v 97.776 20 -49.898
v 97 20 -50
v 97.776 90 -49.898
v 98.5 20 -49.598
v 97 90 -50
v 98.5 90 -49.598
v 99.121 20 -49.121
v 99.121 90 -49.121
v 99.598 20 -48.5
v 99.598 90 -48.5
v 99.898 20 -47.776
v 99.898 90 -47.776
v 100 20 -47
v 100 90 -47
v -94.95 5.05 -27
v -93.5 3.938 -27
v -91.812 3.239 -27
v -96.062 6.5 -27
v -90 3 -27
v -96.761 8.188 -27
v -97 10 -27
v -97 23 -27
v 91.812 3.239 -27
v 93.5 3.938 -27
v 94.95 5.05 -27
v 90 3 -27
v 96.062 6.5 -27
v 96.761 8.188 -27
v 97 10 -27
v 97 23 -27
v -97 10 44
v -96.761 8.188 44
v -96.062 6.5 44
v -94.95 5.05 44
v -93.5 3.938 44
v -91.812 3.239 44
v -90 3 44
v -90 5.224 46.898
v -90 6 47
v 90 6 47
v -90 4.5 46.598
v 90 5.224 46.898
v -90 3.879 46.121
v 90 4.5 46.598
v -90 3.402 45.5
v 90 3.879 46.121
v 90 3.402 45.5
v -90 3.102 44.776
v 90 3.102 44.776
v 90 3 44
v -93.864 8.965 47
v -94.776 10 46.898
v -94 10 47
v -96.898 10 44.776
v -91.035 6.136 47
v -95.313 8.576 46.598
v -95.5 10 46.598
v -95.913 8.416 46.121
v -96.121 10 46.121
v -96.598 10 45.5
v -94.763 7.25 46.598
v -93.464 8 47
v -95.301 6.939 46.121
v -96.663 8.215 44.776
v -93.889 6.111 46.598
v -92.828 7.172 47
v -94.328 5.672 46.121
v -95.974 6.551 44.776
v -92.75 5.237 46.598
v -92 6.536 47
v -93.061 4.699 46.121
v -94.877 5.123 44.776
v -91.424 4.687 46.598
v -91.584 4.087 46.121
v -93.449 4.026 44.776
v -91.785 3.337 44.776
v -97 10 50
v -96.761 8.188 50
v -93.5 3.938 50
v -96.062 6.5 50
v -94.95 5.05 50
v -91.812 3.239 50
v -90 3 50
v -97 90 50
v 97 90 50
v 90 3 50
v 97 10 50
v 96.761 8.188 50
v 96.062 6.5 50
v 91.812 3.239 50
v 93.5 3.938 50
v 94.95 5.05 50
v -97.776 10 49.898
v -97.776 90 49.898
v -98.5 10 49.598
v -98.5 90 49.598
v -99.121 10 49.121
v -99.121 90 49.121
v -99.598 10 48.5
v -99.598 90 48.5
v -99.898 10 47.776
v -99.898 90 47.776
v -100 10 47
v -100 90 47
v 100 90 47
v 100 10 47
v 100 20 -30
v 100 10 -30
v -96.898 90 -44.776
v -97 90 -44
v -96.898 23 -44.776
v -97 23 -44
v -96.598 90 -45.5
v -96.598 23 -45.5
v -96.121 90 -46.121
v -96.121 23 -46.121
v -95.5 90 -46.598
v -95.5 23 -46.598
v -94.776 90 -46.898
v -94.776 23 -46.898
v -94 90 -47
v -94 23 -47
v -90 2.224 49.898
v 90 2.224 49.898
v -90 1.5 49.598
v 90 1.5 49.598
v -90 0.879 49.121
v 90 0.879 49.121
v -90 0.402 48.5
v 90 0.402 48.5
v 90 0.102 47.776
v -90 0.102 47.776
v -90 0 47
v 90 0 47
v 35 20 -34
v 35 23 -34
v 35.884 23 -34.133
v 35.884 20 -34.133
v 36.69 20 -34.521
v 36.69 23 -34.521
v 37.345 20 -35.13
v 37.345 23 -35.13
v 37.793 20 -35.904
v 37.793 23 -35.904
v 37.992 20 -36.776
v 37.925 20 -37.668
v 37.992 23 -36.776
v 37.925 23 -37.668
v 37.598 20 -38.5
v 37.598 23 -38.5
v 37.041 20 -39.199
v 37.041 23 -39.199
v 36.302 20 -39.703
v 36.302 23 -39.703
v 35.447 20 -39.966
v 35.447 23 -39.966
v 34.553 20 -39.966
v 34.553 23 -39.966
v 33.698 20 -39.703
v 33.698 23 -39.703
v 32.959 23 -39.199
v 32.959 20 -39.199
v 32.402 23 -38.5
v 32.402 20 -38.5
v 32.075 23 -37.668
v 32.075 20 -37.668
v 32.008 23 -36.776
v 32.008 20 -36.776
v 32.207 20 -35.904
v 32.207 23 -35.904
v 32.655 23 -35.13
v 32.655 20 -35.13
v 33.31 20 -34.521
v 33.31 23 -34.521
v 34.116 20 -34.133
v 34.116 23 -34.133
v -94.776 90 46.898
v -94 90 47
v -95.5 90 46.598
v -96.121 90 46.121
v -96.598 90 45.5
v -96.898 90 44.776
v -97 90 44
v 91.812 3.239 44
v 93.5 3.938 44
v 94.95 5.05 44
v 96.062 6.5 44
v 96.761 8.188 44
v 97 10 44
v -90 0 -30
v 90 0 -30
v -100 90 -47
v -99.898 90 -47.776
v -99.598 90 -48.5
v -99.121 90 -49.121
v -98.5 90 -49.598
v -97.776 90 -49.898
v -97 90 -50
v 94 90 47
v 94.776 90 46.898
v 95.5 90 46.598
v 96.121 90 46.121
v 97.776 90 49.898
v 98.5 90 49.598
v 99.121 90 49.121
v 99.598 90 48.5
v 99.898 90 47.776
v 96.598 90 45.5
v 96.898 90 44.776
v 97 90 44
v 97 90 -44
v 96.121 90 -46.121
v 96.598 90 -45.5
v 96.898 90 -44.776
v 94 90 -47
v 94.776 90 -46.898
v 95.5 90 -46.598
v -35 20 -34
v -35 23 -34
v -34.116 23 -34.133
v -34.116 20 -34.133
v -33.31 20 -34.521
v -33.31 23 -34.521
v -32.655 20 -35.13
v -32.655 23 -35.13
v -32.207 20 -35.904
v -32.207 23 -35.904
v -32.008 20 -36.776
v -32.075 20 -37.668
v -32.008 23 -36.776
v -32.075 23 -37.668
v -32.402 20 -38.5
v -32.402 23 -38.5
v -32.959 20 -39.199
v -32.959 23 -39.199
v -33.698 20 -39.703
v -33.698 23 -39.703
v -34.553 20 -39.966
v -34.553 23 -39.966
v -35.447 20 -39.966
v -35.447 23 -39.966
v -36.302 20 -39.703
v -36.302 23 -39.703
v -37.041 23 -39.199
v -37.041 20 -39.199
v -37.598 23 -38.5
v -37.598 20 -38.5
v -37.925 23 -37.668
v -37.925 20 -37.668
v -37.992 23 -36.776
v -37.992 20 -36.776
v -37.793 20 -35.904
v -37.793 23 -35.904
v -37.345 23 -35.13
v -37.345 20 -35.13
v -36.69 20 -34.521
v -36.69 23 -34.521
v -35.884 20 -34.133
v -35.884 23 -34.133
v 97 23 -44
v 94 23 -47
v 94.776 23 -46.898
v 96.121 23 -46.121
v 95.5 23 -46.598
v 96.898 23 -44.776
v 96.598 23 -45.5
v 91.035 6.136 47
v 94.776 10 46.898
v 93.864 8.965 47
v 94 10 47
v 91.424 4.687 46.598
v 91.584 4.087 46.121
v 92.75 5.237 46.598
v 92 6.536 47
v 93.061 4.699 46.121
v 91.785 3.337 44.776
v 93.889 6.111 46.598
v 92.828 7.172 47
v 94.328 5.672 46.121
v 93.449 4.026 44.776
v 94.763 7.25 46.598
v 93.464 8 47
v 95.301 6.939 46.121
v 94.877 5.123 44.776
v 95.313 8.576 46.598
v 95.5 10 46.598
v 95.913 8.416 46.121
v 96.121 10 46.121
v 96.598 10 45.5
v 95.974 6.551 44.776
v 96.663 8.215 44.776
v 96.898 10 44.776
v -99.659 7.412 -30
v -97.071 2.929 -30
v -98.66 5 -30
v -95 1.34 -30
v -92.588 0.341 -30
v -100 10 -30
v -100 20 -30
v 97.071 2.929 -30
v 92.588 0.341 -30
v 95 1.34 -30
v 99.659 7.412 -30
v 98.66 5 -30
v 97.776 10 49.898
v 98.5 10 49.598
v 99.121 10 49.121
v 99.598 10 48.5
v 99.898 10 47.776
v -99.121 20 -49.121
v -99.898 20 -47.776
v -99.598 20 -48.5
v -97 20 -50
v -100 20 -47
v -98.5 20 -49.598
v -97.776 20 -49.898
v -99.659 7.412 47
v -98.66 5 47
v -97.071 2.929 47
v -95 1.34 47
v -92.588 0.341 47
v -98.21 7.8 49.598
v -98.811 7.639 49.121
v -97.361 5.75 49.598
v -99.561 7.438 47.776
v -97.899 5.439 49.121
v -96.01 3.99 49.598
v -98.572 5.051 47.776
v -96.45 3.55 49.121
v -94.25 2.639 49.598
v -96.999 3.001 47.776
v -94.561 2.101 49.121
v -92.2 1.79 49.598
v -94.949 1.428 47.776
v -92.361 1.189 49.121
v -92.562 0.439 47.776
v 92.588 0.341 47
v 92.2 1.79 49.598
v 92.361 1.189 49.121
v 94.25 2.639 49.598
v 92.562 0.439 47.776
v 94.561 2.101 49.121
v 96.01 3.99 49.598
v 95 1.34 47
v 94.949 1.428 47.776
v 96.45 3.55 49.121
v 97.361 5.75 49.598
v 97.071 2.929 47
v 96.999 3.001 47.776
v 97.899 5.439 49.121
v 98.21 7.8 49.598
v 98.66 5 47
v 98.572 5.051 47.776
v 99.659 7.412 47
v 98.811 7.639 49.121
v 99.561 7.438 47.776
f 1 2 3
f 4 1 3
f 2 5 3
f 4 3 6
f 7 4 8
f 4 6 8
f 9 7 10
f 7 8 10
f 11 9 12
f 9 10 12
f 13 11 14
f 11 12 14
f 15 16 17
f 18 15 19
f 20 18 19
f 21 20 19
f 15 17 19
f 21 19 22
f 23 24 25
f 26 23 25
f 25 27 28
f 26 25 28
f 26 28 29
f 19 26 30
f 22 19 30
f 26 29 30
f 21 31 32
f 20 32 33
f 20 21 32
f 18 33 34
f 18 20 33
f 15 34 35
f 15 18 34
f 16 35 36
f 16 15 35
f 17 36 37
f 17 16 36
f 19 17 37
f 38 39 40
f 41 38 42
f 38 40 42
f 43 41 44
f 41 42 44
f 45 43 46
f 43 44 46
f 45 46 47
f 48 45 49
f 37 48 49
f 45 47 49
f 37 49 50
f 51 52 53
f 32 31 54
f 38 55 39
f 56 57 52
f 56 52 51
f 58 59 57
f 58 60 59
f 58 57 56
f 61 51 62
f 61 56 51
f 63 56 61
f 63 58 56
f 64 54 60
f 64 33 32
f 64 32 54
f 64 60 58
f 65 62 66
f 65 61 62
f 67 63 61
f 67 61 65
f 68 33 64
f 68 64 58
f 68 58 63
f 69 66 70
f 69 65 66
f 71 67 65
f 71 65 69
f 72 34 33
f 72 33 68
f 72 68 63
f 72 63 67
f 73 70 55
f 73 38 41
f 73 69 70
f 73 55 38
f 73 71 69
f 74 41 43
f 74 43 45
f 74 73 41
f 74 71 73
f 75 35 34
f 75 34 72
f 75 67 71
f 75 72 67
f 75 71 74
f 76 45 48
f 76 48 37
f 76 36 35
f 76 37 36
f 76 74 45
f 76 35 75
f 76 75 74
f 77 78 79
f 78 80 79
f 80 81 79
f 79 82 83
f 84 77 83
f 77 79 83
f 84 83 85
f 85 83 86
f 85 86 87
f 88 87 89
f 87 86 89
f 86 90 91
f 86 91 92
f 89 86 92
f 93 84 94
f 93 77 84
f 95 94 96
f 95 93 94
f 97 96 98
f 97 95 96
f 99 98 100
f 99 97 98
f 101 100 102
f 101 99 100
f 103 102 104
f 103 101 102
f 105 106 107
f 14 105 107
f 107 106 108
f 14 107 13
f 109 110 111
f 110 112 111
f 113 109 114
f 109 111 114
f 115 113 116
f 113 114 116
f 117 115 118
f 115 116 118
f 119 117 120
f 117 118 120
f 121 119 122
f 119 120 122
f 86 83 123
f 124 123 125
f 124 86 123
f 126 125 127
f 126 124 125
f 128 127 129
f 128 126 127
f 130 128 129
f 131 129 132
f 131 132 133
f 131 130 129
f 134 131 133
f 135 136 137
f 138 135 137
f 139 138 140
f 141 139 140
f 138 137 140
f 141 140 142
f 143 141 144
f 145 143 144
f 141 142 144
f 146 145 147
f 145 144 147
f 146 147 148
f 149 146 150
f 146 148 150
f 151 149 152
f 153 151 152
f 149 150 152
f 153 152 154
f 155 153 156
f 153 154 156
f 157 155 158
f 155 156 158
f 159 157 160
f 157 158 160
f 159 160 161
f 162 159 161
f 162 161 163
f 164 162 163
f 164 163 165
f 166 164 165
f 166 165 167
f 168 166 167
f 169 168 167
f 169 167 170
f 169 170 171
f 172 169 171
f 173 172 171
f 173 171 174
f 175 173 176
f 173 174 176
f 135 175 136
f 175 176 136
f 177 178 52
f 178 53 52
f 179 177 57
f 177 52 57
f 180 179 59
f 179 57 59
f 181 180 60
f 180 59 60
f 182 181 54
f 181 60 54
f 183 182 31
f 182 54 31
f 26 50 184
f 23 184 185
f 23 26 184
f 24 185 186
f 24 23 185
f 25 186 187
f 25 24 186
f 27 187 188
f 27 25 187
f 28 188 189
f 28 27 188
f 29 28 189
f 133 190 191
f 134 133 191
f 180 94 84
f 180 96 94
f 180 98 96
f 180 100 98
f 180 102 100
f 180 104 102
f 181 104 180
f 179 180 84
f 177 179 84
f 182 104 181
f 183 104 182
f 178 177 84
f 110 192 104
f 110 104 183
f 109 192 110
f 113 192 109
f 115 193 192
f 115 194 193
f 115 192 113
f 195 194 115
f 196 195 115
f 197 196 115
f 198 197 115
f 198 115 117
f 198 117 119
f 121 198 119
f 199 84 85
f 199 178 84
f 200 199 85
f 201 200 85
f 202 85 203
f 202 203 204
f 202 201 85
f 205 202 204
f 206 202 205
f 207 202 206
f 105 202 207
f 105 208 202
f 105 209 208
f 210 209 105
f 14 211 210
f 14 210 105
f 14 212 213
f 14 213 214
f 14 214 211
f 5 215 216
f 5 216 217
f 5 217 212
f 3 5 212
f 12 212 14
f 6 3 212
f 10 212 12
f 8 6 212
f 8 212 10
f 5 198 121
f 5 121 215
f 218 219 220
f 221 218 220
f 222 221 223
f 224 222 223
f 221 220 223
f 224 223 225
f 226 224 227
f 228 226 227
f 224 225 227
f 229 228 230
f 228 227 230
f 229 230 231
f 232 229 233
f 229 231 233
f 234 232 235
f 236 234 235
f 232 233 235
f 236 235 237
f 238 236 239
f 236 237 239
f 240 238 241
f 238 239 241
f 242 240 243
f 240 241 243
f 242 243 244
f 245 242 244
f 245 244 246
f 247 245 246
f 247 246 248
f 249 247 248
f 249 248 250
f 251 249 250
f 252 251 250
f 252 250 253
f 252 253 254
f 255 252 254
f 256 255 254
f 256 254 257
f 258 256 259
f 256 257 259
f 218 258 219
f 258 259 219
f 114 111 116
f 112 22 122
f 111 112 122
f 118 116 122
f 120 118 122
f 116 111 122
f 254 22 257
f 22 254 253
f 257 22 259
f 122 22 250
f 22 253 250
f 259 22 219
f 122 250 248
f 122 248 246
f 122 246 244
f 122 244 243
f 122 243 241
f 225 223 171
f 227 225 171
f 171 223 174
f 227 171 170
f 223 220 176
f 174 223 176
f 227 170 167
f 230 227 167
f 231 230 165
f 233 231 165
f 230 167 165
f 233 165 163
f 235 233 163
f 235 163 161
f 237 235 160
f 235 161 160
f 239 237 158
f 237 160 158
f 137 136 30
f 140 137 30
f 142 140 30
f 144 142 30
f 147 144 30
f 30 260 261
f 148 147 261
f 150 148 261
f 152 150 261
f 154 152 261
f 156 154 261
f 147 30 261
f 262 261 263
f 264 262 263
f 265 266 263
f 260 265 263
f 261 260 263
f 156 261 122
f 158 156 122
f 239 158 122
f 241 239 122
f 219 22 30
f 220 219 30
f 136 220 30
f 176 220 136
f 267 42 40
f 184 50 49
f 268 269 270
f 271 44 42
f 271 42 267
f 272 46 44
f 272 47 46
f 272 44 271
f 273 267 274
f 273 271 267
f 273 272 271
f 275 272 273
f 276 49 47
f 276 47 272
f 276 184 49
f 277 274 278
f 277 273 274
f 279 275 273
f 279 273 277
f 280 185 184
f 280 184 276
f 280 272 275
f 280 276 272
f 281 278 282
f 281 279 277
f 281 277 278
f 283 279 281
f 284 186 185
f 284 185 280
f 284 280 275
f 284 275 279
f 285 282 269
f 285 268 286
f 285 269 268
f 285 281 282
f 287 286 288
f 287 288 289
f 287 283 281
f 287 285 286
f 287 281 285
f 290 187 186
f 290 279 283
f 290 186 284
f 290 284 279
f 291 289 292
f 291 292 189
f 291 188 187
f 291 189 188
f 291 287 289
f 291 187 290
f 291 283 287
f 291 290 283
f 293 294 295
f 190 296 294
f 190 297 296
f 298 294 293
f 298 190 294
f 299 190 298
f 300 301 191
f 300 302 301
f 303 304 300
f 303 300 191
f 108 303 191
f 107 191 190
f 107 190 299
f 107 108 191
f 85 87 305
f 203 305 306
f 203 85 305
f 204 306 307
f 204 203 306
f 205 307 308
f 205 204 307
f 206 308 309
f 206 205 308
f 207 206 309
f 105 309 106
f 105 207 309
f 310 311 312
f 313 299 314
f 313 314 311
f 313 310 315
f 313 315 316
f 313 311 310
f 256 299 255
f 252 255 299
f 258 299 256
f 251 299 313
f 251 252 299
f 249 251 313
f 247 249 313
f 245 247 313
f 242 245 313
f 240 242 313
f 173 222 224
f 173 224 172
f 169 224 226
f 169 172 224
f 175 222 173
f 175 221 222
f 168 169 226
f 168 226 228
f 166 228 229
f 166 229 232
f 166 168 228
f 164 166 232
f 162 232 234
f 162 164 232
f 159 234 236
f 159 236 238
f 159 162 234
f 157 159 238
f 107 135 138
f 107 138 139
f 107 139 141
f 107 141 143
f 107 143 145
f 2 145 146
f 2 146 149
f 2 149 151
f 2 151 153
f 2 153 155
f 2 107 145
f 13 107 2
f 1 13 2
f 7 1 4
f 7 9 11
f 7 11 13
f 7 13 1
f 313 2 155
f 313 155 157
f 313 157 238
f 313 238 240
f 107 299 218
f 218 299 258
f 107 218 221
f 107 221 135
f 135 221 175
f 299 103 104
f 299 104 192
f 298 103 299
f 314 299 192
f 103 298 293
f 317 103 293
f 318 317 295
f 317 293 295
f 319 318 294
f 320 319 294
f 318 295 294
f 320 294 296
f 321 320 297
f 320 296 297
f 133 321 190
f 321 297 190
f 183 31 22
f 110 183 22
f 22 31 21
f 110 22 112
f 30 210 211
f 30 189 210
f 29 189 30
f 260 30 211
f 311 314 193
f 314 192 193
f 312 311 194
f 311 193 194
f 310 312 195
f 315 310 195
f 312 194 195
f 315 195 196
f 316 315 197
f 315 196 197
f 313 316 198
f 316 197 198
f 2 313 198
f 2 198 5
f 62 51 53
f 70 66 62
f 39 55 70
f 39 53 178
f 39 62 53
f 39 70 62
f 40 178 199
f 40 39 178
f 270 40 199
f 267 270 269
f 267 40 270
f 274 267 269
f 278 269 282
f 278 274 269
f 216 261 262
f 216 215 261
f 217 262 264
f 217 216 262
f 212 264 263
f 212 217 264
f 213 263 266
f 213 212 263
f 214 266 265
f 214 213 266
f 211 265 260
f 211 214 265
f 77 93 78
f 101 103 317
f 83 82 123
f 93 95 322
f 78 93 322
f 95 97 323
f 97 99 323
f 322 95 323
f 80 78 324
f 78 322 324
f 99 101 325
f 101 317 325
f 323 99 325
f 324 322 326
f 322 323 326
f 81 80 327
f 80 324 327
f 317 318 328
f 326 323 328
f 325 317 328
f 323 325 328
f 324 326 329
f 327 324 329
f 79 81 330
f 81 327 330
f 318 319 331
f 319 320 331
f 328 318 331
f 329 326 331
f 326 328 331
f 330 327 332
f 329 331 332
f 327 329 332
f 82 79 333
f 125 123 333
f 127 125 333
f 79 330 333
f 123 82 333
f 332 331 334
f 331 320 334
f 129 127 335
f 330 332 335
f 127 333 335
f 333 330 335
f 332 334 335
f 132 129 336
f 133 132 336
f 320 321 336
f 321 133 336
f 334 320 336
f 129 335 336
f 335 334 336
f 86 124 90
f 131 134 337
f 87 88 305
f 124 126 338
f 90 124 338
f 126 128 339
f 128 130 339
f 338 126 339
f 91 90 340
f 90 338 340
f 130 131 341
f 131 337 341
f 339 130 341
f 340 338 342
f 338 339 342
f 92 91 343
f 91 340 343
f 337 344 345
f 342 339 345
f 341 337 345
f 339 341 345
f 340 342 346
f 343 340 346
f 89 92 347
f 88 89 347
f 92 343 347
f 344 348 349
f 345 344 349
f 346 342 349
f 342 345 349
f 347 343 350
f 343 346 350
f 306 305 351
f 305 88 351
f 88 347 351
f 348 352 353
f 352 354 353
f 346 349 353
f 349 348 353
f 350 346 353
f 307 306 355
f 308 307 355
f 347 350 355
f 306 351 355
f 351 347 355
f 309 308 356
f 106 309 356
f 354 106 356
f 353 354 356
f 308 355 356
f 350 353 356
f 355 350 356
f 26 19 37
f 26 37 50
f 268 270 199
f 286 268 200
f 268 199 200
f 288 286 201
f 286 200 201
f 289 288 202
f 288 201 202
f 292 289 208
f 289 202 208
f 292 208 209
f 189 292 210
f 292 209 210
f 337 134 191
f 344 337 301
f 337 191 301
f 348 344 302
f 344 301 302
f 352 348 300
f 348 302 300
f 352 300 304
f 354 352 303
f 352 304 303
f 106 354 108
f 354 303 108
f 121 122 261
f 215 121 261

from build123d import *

# Parameters (mm, degrees)
SKETCH_1_W          = 200
SKETCH_1_H          = 100
EXTRUDE_1_DEPTH     = 90
SKETCH_2_W          = 20
SKETCH_2_H          = 20
CUT_EXTRUDE_1_DEPTH = 200
FILLET_1_R          = 10
SHELL_1_T           = -3
FILLET_2_R          = 3
SKETCH_3_R          = 3
CUT_EXTRUDE_2_DEPTH = 3


with BuildPart() as part:
    # 草圖1 → 填料-伸長1 (new body)
    with BuildSketch(Plane(origin=(0, 0, 0), x_dir=(1, 0, 0), z_dir=(0, 1, 0))):
        Rectangle(SKETCH_1_W, SKETCH_1_H)
    extrude(amount=EXTRUDE_1_DEPTH)

    # 草圖2 → 除料-伸長1 (cut)
    with BuildSketch(Plane(origin=(100, 0, 0), x_dir=(0, 0, -1), z_dir=(1, 0, 0))):
        with Locations((40, 10)):
            Rectangle(SKETCH_2_W, SKETCH_2_H)
    extrude(amount=-CUT_EXTRUDE_1_DEPTH, mode=Mode.SUBTRACT)

    # 圓角1
    fillet_1_edges = [part.edges().sort_by_distance(p)[0] for p in [
        (-100, 0, 10),
        (100, 0, 10),
    ]]
    fillet(fillet_1_edges, radius=FILLET_1_R)

    # 薄殼1
    shell_1_openings = [part.faces().sort_by_distance(p)[0] for p in [
        (0, 90, 0),
    ]]
    offset(amount=SHELL_1_T, openings=shell_1_openings, kind=Kind.INTERSECTION)

    # 圓角2
    fillet_2_edges = [part.edges().sort_by_distance(p)[0] for p in [
        (0, 0, 50),
        (97.071067812, 2.928932188, 50),
        (-97.071067812, 2.928932188, 50),
        (97, 50, 47),
        (97, 56.5, -47),
        (-97, 56.5, -47),
        (-97, 50, 47),
        (-94.949747468, 5.050252532, 47),
        (0, 3, 47),
        (94.949747468, 5.050252532, 47),
        (100, 50, 50),
        (-100, 50, 50),
        (-100, 55, -50),
        (100, 55, -50),
    ]]
    fillet(fillet_2_edges, radius=FILLET_2_R)

    # 草圖3 → 除料-伸長2 (cut)
    with BuildSketch(Plane(origin=(0, 23, 0), x_dir=(1, 0, 0), z_dir=(0, 1, 0))):
        with Locations(Location((-35, 37, 0), (0, 0, 270))):
            Circle(SKETCH_3_R)
        with Locations(Location((35, 37, 0), (0, 0, 270))):
            Circle(SKETCH_3_R)
    extrude(amount=-CUT_EXTRUDE_2_DEPTH, mode=Mode.SUBTRACT)


solid = part.part
